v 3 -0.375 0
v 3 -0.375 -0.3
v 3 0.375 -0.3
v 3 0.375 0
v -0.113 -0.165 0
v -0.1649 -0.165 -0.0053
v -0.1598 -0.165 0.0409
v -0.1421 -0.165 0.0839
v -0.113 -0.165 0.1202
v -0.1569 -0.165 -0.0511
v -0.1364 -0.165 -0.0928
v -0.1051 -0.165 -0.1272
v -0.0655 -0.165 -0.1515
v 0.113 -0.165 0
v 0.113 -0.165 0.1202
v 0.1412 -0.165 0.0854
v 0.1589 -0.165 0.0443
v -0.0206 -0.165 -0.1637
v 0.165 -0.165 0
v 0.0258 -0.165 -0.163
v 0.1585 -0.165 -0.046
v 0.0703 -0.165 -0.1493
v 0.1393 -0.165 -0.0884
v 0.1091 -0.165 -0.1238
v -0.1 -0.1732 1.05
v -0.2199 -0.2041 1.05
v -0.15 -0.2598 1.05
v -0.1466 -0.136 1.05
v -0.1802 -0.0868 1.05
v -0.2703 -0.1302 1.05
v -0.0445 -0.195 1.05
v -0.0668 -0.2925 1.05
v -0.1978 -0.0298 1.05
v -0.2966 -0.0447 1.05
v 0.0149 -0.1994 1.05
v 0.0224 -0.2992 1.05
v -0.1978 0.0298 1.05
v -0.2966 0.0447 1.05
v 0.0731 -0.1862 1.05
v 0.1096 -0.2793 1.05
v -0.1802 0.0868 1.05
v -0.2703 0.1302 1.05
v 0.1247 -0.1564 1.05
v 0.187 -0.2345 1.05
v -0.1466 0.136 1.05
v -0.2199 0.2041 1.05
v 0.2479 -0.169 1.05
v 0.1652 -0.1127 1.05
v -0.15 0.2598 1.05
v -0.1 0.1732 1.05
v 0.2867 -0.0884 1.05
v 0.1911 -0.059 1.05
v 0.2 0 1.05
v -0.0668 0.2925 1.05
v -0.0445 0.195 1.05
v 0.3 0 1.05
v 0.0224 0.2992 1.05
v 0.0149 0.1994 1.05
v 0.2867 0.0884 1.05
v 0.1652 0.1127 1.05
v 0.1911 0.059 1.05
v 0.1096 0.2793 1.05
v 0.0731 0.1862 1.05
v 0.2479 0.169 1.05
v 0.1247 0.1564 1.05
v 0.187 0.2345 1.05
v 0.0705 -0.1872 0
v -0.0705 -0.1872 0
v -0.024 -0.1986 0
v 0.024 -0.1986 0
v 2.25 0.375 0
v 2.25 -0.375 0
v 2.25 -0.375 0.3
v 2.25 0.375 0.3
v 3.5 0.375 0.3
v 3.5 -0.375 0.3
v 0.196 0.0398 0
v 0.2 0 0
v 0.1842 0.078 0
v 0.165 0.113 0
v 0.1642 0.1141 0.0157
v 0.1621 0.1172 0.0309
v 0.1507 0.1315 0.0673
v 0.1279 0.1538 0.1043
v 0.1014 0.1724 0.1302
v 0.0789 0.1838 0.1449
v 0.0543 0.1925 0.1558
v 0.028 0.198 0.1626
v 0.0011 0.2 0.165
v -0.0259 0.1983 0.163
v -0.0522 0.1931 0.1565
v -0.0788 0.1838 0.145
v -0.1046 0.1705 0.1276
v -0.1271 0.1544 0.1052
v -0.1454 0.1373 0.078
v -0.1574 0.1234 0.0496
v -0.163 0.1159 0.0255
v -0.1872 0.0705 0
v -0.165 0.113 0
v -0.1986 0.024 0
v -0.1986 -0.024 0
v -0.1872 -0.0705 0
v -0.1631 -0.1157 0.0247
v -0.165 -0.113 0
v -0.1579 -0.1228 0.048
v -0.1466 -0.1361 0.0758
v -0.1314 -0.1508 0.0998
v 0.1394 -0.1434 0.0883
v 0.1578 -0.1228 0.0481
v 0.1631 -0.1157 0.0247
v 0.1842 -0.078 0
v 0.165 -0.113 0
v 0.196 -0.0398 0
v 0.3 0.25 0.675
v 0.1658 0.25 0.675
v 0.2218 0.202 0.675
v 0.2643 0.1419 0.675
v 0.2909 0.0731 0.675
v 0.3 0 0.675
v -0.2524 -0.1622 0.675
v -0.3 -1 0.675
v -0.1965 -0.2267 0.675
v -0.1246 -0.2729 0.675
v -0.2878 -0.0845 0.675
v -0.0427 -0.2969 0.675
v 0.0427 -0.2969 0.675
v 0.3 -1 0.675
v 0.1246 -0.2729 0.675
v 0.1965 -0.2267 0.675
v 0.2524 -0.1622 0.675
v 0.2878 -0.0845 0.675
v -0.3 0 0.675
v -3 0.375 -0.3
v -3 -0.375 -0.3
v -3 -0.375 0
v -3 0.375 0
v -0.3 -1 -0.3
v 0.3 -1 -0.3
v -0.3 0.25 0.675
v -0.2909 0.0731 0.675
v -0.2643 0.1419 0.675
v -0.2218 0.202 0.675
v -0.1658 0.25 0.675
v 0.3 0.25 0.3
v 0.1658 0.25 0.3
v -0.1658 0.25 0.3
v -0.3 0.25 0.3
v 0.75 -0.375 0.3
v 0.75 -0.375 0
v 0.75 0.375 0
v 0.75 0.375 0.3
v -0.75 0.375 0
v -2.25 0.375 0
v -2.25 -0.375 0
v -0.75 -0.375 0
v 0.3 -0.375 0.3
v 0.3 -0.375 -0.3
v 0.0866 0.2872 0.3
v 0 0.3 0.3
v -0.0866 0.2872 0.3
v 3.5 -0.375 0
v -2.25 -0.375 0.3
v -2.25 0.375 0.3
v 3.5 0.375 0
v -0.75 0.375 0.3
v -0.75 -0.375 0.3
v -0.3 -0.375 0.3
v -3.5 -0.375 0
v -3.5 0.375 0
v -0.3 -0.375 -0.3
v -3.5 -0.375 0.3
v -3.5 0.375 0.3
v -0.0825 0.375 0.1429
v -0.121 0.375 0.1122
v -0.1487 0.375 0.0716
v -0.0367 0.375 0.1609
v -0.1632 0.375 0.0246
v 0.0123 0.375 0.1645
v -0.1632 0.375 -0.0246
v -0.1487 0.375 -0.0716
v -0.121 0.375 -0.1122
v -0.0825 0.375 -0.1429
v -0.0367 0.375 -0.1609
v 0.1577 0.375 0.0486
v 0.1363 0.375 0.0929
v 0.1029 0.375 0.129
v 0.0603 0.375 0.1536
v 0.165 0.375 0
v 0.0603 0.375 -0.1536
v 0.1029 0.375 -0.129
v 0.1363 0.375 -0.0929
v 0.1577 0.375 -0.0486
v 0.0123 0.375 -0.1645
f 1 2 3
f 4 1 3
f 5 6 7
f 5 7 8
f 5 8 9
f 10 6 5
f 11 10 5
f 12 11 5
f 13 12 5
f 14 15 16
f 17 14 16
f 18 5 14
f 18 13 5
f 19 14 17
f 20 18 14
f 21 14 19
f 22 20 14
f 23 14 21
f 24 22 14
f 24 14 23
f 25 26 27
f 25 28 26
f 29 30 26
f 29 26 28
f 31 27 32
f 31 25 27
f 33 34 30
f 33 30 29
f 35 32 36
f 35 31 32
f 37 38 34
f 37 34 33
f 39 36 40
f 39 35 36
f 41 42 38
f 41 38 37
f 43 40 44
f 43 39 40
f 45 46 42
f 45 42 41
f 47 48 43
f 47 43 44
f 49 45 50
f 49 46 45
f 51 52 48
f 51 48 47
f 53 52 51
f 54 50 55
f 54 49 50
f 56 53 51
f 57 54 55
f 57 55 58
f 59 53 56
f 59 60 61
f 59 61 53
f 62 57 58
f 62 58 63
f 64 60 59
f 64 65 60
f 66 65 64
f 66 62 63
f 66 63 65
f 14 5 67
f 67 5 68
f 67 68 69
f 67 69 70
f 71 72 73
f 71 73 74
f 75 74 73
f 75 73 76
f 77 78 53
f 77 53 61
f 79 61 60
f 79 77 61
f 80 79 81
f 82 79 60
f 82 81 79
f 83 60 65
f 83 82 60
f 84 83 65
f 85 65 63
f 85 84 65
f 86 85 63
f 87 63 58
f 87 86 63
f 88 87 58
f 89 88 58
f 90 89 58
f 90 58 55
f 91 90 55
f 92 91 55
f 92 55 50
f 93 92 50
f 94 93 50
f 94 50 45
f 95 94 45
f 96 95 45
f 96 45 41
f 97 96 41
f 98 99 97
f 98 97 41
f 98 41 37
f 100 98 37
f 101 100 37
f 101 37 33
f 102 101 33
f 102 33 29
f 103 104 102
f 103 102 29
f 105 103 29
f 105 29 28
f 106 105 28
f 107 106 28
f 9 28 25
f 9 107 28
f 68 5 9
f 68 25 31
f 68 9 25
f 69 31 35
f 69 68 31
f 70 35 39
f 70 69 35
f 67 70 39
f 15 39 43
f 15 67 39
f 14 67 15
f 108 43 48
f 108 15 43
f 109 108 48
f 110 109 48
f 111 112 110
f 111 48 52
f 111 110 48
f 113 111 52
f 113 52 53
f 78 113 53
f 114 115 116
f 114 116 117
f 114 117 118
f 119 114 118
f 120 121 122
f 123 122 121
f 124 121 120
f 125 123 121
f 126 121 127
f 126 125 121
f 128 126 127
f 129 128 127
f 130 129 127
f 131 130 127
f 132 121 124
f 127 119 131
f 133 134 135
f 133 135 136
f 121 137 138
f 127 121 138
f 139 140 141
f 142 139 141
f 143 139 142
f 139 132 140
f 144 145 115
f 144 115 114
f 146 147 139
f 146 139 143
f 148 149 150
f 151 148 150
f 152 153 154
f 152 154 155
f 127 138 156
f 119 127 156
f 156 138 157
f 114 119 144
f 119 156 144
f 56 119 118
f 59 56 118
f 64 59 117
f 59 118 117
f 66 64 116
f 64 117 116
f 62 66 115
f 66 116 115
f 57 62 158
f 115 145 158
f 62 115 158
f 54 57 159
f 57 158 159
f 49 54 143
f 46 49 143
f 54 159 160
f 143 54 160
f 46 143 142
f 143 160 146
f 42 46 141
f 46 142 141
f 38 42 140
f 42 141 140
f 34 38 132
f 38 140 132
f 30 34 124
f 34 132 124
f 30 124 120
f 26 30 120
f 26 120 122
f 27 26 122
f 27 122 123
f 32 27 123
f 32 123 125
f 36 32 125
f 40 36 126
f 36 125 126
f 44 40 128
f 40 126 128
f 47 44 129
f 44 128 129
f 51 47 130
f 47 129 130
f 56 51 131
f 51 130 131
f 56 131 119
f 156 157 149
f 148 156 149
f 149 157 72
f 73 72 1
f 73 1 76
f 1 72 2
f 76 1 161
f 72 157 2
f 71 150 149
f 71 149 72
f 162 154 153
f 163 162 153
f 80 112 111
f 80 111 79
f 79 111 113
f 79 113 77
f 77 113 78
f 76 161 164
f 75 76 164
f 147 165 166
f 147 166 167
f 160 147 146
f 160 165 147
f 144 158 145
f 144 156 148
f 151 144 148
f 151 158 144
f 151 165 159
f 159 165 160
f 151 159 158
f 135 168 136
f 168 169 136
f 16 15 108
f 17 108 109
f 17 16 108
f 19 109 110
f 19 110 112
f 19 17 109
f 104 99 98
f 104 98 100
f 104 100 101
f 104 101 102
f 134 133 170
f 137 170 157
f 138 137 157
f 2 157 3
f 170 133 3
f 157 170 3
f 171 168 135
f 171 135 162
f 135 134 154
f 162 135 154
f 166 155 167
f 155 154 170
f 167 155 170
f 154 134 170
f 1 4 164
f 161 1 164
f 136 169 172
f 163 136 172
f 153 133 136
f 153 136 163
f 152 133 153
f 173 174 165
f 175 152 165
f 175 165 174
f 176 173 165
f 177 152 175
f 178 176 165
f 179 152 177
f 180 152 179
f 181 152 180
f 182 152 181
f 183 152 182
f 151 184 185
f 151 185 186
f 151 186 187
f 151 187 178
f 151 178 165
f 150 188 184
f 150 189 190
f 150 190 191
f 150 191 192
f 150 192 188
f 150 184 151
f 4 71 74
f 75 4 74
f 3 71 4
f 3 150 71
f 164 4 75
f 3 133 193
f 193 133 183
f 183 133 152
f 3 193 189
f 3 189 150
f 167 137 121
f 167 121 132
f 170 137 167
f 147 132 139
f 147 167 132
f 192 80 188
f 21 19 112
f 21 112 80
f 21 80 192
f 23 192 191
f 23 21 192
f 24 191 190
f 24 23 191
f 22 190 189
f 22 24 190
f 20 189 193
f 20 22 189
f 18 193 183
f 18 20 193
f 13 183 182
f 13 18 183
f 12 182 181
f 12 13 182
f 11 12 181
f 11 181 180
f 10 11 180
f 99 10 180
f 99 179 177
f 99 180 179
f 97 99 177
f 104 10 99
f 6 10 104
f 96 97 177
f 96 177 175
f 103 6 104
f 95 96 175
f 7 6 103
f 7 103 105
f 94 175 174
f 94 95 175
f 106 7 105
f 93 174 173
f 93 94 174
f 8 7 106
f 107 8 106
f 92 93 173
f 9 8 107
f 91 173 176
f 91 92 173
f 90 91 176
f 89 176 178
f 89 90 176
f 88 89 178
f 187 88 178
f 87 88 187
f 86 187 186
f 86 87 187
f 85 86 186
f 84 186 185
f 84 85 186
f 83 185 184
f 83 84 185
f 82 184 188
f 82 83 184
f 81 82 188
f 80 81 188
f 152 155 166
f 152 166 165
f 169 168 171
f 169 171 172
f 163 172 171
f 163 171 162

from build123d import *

# Parameters (mm, degrees)
CYLINDER136_R          = 0.2
CYLINDER136_DEPTH      = 9
BOX001_W               = 1
BOX001_H               = 2
BOX001_DEPTH           = 2
BOX002_W               = 1
BOX002_H               = 2
BOX002_DEPTH           = 2
BOX004_W               = 1.5
BOX004_H               = 2
BOX004_DEPTH           = 1
BOX005_W               = 1.5
BOX005_H               = 2
BOX005_DEPTH           = 1
CYLINDER138_R          = 0.165
CYLINDER138_DEPTH      = 14
CYLINDER138_ROLL_ANGLE = -90
BOX003_W               = 0.6
BOX003_H               = 1.25
BOX003_DEPTH           = 0.975
CYLINDER140_R          = 0.3
CYLINDER140_DEPTH      = 0.75
BOX_W                  = 7
BOX_H                  = 0.75
BOX_DEPTH              = 0.6


with BuildPart() as bowtienozzle:
    # Cylinder136 → Cylinder136 (new body)
    with BuildSketch(Plane.XY):
        Circle(CYLINDER136_R)
    extrude(amount=CYLINDER136_DEPTH)


with BuildPart() as cube:
    # Box001 → Box001 (new body)
    with BuildSketch(Plane(origin=(3, -1, -2), x_dir=(1, 0, 0), z_dir=(0, 0, 1))):
        with Locations((0.5, 1)):
            Rectangle(BOX001_W, BOX001_H)
    extrude(amount=BOX001_DEPTH)


with BuildPart() as cube001:
    # Box002 → Box002 (new body)
    with BuildSketch(Plane(origin=(-4, -1, -2), x_dir=(1, 0, 0), z_dir=(0, 0, 1))):
        with Locations((0.5, 1)):
            Rectangle(BOX002_W, BOX002_H)
    extrude(amount=BOX002_DEPTH)


with BuildPart() as cube003:
    # Box004 → Box004 (new body)
    with BuildSketch(Plane(origin=(0.75, -1, 0), x_dir=(1, 0, 0), z_dir=(0, 0, 1))):
        with Locations((0.75, 1)):
            Rectangle(BOX004_W, BOX004_H)
    extrude(amount=BOX004_DEPTH)


with BuildPart() as cube004:
    # Box005 → Box005 (new body)
    with BuildSketch(Plane(origin=(-2.25, -1, 0), x_dir=(1, 0, 0), z_dir=(0, 0, 1))):
        with Locations((0.75, 1)):
            Rectangle(BOX005_W, BOX005_H)
    extrude(amount=BOX005_DEPTH)


with BuildPart() as fusion001:
    # Cylinder138 → Cylinder138 (new body)
    with BuildSketch(Plane.XY):
        Circle(CYLINDER138_R)
    extrude(amount=CYLINDER138_DEPTH)


with BuildPart() as fusion001_1:
    # Cylinder138 roll: moved
    add(fusion001.part.rotate(Axis((0, 0, 0), (1, 0, 0)), CYLINDER138_ROLL_ANGLE))


with BuildPart() as fusion001_2:
    # Cylinder138 placement: moved
    add(fusion001_1.part.moved(Location((0, -0.165, 0))))

    # Fusion001: union BowTieNozzle, Cube, Cube001, Cube003, Cube004
    add(bowtienozzle.part)
    add(cube.part)
    add(cube001.part)
    add(cube003.part)
    add(cube004.part)


with BuildPart() as cube002:
    # Box003 → Box003 (new body)
    with BuildSketch(Plane(origin=(-0.3, -1, -0.3), x_dir=(1, 0, 0), z_dir=(0, 0, 1))):
        with Locations((0.3, 0.625)):
            Rectangle(BOX003_W, BOX003_H)
    extrude(amount=BOX003_DEPTH)


with BuildPart() as nozzle_od:
    # Cylinder140 → Cylinder140 (new body)
    with BuildSketch(Plane.XY.offset(0.3)):
        Circle(CYLINDER140_R)
    extrude(amount=CYLINDER140_DEPTH)


with BuildPart() as cut:
    # Box → Box (new body)
    with BuildSketch(Plane(origin=(-3.5, -0.375, -0.3), x_dir=(1, 0, 0), z_dir=(0, 0, 1))):
        with Locations((3.5, 0.375)):
            Rectangle(BOX_W, BOX_H)
    extrude(amount=BOX_DEPTH)

    # Fusion: union Nozzle_OD
    add(nozzle_od.part)

    # Fusion002: union Cube002
    add(cube002.part)

    # Cut: cut Fusion001
    add(fusion001_2.part, mode=Mode.SUBTRACT)


solid = cut.part
